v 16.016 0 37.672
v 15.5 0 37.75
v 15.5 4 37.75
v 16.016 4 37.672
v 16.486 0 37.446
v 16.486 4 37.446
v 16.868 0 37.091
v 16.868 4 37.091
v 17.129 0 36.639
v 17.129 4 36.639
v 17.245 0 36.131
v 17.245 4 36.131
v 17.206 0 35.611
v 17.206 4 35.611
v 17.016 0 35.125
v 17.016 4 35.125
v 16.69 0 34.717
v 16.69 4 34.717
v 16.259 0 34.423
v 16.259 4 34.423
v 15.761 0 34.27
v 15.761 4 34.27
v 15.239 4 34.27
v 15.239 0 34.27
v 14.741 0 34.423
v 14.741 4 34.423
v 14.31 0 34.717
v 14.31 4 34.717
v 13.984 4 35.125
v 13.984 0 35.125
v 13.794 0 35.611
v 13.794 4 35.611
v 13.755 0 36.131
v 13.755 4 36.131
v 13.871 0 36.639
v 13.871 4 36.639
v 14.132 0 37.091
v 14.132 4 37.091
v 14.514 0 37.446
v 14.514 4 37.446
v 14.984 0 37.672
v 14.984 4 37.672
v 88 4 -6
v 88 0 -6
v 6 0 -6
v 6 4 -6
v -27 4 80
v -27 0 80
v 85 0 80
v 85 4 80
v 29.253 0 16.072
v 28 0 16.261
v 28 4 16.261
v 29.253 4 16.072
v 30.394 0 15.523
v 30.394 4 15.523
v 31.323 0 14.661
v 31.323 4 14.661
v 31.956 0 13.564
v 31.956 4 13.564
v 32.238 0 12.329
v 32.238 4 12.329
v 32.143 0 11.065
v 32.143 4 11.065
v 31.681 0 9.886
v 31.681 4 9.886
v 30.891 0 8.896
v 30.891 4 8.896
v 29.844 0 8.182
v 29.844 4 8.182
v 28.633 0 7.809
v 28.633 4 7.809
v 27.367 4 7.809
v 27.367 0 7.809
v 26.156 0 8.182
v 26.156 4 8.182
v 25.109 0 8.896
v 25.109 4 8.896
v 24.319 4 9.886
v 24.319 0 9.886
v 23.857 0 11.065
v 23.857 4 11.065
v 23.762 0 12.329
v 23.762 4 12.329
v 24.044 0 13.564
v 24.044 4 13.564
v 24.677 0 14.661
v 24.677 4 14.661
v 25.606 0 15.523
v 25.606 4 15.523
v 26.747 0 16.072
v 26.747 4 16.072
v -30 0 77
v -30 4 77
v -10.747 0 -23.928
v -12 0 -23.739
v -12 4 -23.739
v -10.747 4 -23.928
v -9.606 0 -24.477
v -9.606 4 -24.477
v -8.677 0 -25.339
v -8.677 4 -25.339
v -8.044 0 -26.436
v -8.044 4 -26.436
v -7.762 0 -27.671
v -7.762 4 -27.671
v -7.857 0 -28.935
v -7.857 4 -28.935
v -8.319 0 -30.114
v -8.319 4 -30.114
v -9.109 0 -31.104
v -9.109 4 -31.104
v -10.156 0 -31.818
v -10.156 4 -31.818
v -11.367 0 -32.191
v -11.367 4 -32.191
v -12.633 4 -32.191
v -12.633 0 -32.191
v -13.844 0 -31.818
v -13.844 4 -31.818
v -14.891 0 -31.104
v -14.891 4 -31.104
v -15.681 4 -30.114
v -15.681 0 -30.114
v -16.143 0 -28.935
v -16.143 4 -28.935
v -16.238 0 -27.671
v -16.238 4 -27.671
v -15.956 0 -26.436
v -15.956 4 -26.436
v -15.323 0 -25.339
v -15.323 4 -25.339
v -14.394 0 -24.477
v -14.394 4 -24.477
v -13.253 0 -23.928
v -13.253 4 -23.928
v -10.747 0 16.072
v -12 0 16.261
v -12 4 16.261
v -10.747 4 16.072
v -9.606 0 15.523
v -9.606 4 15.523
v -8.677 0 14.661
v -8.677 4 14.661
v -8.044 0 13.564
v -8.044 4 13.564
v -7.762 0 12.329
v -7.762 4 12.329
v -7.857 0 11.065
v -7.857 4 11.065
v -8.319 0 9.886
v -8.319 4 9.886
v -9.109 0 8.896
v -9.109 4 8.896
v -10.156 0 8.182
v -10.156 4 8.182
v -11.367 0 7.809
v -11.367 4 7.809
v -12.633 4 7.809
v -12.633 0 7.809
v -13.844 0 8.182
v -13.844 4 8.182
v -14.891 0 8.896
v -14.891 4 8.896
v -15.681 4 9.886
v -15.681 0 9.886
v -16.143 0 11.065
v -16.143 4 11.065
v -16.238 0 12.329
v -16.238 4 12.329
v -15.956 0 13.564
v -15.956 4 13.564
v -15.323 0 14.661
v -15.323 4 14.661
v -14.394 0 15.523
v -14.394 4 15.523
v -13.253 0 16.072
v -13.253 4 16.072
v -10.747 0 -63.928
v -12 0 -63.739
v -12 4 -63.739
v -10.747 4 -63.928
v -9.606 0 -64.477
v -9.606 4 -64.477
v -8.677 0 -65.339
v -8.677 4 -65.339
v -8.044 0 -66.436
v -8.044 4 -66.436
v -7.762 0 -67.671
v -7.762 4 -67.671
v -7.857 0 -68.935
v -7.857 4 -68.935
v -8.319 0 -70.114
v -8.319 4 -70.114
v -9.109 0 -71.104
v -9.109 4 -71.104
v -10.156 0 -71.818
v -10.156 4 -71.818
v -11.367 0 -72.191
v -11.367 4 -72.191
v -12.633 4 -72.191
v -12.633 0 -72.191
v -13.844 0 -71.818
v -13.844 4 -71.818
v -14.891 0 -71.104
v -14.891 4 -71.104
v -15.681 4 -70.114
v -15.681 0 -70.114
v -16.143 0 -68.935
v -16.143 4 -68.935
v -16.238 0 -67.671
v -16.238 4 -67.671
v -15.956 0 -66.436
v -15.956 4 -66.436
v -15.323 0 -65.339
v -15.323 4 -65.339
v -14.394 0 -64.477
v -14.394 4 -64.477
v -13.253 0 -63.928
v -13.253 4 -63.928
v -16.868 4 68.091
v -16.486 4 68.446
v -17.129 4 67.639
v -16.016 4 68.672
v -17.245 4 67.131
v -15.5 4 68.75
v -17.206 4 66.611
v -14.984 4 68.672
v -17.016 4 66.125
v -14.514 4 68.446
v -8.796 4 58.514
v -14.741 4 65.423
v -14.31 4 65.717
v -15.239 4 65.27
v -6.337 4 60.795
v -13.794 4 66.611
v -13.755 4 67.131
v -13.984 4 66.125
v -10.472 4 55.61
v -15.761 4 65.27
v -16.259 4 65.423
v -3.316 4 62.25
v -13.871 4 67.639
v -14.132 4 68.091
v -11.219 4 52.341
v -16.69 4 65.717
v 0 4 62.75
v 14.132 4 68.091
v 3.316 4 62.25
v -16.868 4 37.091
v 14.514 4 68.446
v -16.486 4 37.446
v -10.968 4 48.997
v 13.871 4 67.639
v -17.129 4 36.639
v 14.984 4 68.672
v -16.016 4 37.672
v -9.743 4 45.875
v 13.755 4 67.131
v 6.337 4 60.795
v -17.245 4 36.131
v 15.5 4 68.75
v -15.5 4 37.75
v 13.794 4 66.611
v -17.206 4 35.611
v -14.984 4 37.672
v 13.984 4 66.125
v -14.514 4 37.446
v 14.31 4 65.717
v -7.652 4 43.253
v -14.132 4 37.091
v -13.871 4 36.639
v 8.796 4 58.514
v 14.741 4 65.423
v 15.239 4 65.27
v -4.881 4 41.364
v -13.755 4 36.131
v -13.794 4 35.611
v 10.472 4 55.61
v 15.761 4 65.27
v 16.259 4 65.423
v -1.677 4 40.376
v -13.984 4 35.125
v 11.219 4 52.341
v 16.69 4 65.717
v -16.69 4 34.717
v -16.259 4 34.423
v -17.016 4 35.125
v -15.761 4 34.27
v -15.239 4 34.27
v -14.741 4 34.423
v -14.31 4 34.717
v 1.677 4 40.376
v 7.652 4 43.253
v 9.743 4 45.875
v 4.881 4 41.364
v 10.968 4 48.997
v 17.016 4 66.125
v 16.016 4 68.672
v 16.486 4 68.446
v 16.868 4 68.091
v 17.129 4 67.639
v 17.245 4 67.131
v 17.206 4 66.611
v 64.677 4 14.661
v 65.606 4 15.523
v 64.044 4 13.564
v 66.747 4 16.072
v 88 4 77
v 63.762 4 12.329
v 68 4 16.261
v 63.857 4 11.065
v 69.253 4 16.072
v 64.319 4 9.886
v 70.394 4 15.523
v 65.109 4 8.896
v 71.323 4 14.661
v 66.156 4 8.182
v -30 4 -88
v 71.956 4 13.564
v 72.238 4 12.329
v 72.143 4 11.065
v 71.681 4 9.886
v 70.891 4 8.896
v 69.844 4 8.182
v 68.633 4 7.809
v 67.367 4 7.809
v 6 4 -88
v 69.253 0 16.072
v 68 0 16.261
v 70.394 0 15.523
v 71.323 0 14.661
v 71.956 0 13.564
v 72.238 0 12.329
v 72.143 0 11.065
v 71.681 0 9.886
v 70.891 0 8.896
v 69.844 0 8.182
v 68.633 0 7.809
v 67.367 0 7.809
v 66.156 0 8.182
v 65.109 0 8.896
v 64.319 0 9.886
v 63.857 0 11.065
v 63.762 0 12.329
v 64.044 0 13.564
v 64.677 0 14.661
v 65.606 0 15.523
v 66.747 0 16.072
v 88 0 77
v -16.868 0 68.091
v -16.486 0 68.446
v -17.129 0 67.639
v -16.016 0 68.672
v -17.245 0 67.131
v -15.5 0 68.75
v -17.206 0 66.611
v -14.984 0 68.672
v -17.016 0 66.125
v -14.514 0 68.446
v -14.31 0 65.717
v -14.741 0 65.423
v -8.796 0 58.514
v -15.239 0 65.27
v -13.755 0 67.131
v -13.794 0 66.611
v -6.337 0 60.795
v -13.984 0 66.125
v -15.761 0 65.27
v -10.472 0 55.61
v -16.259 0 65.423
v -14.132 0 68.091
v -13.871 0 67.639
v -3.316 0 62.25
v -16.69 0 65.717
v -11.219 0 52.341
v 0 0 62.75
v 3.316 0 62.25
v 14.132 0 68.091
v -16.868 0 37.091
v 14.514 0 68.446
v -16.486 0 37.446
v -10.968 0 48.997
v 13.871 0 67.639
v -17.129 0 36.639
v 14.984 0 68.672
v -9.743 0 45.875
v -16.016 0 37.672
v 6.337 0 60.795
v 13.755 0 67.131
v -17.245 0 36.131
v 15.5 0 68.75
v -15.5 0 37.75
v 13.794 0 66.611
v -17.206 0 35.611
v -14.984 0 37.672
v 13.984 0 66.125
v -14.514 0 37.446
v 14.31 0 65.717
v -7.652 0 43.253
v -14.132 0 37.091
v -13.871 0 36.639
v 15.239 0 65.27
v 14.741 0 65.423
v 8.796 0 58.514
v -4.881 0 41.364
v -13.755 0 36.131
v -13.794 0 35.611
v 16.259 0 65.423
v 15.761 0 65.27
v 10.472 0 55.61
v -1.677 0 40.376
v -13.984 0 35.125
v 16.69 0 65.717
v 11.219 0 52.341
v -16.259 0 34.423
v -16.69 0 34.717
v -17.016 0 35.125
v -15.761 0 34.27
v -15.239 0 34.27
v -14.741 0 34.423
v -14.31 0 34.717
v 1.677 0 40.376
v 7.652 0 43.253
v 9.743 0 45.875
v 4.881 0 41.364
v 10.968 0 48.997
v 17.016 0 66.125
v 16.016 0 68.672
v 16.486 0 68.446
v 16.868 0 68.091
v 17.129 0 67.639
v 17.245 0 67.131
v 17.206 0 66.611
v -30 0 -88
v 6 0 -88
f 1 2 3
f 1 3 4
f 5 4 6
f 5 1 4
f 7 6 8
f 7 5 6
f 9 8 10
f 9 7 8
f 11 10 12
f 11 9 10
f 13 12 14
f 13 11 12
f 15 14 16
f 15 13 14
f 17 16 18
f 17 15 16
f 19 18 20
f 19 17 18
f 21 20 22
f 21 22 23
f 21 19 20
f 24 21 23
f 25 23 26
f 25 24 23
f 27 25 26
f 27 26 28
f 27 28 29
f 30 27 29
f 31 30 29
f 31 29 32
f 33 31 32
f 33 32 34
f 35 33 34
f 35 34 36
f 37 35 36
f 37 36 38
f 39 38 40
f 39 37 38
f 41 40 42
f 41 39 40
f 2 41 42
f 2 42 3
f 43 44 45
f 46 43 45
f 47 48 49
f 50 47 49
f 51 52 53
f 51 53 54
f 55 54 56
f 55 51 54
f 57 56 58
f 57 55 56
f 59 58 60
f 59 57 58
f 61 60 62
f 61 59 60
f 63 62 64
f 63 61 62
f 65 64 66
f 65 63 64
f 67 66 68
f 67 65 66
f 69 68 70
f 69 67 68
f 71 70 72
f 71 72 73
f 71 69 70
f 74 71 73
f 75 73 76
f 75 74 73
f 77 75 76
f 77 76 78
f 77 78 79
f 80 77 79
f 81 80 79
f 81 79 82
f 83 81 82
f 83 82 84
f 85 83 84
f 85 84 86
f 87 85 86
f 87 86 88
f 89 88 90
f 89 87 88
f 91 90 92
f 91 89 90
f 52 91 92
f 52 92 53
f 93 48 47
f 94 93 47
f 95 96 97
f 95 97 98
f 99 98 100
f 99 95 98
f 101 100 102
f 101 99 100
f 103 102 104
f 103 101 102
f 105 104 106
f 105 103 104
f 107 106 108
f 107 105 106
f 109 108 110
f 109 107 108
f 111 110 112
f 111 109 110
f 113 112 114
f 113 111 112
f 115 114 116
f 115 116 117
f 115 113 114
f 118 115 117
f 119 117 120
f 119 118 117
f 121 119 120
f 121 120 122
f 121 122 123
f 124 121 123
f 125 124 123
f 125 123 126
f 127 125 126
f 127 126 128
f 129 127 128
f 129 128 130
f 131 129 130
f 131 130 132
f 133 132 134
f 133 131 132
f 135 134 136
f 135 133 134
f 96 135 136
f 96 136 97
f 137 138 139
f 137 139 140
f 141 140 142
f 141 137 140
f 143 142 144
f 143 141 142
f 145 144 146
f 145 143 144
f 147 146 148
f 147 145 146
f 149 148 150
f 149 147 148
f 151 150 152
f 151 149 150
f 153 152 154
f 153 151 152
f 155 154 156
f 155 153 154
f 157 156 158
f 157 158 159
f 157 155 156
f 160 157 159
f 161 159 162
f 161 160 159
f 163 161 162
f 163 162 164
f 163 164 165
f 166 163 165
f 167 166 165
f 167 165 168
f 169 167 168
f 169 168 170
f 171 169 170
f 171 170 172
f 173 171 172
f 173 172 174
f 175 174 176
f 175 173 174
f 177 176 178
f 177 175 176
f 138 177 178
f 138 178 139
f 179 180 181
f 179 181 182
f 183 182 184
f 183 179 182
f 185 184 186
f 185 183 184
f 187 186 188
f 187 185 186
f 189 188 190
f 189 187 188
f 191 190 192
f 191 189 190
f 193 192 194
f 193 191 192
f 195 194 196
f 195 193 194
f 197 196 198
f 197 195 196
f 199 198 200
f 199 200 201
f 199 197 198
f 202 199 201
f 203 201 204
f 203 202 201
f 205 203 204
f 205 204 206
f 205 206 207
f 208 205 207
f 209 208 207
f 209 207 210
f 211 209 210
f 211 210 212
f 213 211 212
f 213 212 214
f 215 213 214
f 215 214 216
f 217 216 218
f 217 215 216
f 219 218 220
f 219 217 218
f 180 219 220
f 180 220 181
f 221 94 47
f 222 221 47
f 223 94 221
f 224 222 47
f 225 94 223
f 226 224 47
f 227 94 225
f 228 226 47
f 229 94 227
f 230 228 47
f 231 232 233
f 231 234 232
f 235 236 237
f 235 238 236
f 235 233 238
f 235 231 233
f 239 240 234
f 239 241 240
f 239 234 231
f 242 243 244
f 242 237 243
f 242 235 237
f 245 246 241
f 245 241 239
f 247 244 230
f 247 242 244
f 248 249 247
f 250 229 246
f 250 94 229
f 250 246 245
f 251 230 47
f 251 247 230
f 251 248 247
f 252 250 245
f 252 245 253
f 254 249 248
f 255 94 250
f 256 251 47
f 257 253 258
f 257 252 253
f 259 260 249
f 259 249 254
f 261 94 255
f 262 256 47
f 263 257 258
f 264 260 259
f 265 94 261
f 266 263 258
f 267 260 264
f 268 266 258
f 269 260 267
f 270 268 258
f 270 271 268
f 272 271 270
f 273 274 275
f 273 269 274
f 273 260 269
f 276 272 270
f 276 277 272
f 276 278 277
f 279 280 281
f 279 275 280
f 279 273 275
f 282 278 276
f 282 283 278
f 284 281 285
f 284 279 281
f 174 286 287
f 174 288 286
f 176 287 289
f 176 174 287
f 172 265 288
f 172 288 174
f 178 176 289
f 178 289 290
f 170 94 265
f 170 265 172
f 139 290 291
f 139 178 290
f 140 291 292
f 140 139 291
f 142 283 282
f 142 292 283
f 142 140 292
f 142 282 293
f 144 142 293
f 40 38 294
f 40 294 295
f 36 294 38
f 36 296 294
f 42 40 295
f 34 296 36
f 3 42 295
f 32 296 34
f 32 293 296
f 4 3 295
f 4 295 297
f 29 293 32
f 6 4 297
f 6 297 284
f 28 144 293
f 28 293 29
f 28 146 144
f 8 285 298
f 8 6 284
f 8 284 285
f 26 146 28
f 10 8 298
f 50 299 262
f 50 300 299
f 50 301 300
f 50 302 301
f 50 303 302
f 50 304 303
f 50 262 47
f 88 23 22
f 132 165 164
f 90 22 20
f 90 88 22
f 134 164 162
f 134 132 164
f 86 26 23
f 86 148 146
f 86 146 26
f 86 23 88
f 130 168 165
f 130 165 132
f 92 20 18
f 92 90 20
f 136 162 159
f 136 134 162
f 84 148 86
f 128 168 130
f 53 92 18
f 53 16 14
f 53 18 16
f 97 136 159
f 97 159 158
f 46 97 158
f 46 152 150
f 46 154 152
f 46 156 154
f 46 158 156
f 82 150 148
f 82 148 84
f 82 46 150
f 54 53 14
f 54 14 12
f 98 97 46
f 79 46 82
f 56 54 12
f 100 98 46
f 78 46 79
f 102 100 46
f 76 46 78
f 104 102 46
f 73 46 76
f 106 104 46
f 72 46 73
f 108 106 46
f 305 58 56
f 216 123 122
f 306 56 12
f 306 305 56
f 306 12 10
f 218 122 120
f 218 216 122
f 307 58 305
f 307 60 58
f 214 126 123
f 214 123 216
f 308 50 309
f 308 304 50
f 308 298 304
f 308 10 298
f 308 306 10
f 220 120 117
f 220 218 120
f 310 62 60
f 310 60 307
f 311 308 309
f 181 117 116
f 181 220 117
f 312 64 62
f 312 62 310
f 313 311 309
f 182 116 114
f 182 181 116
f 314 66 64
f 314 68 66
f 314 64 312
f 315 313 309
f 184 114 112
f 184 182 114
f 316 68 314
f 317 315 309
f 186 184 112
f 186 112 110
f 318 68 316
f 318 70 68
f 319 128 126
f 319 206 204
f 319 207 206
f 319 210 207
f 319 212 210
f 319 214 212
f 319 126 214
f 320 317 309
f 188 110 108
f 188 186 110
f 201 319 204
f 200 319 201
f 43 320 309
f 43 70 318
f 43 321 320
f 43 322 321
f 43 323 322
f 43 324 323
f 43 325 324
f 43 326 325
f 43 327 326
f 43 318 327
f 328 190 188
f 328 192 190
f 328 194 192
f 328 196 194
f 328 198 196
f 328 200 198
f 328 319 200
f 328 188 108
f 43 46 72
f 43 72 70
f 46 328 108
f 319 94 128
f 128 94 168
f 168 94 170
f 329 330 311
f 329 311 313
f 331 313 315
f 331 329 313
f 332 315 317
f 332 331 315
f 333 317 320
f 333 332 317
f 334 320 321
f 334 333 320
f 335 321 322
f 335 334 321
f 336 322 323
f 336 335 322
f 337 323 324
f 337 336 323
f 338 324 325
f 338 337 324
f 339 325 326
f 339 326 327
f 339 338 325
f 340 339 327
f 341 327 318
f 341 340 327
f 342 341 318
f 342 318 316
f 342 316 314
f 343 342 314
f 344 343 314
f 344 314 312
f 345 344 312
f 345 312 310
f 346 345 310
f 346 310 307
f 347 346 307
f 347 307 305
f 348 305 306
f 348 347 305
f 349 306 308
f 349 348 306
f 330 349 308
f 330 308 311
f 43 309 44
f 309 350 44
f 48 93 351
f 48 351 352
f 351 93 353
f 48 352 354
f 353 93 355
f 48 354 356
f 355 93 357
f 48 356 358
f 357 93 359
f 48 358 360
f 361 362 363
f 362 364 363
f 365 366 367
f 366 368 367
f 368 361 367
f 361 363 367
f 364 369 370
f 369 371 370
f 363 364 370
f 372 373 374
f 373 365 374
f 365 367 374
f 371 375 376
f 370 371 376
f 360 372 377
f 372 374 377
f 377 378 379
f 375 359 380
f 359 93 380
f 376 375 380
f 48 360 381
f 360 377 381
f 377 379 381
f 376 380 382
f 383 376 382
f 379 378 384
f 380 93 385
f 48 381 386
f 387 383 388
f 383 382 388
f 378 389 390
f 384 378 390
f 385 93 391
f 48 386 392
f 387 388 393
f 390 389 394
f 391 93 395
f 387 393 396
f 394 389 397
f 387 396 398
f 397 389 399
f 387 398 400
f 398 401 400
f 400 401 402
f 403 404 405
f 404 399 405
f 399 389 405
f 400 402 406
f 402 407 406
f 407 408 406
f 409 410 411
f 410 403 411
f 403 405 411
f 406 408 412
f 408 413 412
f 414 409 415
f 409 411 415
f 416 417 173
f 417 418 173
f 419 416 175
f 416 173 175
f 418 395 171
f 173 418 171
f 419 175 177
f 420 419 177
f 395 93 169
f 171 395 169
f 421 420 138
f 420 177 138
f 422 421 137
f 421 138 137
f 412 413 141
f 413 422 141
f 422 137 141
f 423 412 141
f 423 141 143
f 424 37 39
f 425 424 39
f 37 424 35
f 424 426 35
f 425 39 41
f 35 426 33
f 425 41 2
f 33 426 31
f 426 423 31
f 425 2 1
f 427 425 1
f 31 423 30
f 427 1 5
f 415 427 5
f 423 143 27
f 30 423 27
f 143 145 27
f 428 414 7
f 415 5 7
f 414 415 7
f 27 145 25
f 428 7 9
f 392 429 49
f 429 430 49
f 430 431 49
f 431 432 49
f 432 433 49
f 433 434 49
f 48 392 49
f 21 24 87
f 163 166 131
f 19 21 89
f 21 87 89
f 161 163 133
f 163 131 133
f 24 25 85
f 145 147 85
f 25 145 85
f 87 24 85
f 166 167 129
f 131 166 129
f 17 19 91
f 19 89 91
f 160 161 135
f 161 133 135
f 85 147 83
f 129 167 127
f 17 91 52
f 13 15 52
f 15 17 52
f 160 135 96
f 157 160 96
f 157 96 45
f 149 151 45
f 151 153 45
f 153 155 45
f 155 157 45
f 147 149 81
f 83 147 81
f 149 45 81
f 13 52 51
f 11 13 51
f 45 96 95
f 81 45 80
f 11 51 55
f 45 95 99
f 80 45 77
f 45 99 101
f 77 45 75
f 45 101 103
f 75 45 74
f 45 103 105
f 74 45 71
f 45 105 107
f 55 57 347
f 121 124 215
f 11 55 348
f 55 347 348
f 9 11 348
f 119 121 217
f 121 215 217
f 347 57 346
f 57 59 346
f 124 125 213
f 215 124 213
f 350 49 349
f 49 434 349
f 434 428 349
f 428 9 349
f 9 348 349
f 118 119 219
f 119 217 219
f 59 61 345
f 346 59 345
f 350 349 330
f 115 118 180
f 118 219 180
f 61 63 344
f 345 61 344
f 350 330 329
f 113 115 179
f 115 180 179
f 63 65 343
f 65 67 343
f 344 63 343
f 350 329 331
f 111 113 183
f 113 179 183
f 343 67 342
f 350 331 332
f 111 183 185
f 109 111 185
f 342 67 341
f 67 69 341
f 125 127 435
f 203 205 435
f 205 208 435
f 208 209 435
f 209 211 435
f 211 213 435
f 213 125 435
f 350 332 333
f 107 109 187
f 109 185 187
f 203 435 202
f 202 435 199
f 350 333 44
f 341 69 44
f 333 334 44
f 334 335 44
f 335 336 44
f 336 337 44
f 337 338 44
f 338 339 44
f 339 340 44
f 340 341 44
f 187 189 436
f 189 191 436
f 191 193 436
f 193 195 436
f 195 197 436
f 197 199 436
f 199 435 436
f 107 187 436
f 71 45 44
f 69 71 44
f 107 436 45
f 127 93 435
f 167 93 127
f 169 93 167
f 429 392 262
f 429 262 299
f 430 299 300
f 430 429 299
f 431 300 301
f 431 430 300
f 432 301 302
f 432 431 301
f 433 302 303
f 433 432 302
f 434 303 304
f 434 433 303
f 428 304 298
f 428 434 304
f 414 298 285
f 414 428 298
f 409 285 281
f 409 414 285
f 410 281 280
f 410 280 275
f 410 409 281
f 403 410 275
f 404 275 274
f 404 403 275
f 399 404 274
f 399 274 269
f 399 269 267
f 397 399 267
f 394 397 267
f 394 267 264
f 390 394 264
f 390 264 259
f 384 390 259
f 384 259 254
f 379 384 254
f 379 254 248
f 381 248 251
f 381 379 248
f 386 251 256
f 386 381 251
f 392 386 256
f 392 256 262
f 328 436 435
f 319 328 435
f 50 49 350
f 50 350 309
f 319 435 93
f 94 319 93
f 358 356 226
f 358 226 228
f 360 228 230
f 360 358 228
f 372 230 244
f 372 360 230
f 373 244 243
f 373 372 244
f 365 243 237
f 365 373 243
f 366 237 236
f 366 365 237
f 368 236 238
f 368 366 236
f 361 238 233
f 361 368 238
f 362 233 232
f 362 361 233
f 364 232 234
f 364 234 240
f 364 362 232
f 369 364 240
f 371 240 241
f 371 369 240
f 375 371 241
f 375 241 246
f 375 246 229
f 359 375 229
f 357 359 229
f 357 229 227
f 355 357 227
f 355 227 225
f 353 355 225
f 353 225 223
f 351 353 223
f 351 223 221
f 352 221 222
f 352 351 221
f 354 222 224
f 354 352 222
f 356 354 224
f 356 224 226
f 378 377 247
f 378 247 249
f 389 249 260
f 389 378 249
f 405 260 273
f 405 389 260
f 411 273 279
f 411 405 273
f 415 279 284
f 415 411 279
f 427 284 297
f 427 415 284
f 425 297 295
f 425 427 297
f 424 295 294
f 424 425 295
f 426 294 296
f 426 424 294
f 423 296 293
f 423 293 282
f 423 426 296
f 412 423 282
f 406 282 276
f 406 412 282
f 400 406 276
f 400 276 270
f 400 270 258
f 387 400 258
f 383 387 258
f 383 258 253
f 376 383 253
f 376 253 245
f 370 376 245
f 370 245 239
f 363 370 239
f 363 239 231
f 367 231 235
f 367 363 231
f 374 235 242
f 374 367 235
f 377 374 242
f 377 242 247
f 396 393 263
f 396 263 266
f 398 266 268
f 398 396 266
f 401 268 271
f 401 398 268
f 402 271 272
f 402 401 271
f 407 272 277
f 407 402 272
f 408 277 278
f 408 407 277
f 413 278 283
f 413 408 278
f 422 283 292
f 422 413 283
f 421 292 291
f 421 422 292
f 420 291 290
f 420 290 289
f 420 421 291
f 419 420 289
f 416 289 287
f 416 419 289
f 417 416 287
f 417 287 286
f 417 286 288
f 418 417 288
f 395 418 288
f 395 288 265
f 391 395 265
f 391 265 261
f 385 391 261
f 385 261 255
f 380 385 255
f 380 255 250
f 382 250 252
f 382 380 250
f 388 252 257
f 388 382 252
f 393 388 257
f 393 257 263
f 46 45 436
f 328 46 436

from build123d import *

# Parameters (mm, degrees)
SKETCH1_R           = 4.25
BOSS_EXTRUDE1_DEPTH = 4
SKETCH1_3_R         = 1.75
SKETCH1_3_R_2       = 11.25
BOSS_EXTRUDE2_DEPTH = 4
CHAMFER1_SIZE       = 3


with BuildPart() as part:
    # Sketch1 → Boss-Extrude1 (new body)
    with BuildSketch(Plane(origin=(0, 0, 0), x_dir=(1, 0, 0), z_dir=(0, 1, 0))):
        Polygon((-30, 88), (-30, -30), (88, -30.072989915), (88, -30), (88, 6), (6, 6), (6, 88), align=None)
        with Locations((-12, -12.011130611)):
            Circle(SKETCH1_R, mode=Mode.SUBTRACT)
        with Locations((28, -12.011130611)):
            Circle(SKETCH1_R, mode=Mode.SUBTRACT)
        with Locations((68, -12.011130611)):
            Circle(SKETCH1_R, mode=Mode.SUBTRACT)
        with Locations((-12, 27.988869389)):
            Circle(SKETCH1_R, mode=Mode.SUBTRACT)
        with Locations((-12, 67.988869389)):
            Circle(SKETCH1_R, mode=Mode.SUBTRACT)
    extrude(amount=BOSS_EXTRUDE1_DEPTH)

    # Sketch1<3> → Boss-Extrude2 (add)
    with BuildSketch(Plane(origin=(0, 0, 0), x_dir=(1, 0, 0), z_dir=(0, 1, 0))):
        Polygon((88, -30.072989915), (-30, -30), (-30, -80), (88, -80), align=None)
        with Locations((-15.5, -67)):
            Circle(SKETCH1_3_R, mode=Mode.SUBTRACT)
        with Locations((15.5, -67)):
            Circle(SKETCH1_3_R, mode=Mode.SUBTRACT)
        with Locations((0, -51.5)):
            Circle(SKETCH1_3_R_2, mode=Mode.SUBTRACT)
        with Locations((-15.5, -36)):
            Circle(SKETCH1_3_R, mode=Mode.SUBTRACT)
        with Locations((15.5, -36)):
            Circle(SKETCH1_3_R, mode=Mode.SUBTRACT)
    extrude(amount=BOSS_EXTRUDE2_DEPTH)

    # Chamfer1
    chamfer1_edges = [part.edges().sort_by_distance(p)[0] for p in [
        (88, 2, 80),
        (-30, 2, 80),
    ]]
    chamfer(chamfer1_edges, length=CHAMFER1_SIZE)


solid = part.part
